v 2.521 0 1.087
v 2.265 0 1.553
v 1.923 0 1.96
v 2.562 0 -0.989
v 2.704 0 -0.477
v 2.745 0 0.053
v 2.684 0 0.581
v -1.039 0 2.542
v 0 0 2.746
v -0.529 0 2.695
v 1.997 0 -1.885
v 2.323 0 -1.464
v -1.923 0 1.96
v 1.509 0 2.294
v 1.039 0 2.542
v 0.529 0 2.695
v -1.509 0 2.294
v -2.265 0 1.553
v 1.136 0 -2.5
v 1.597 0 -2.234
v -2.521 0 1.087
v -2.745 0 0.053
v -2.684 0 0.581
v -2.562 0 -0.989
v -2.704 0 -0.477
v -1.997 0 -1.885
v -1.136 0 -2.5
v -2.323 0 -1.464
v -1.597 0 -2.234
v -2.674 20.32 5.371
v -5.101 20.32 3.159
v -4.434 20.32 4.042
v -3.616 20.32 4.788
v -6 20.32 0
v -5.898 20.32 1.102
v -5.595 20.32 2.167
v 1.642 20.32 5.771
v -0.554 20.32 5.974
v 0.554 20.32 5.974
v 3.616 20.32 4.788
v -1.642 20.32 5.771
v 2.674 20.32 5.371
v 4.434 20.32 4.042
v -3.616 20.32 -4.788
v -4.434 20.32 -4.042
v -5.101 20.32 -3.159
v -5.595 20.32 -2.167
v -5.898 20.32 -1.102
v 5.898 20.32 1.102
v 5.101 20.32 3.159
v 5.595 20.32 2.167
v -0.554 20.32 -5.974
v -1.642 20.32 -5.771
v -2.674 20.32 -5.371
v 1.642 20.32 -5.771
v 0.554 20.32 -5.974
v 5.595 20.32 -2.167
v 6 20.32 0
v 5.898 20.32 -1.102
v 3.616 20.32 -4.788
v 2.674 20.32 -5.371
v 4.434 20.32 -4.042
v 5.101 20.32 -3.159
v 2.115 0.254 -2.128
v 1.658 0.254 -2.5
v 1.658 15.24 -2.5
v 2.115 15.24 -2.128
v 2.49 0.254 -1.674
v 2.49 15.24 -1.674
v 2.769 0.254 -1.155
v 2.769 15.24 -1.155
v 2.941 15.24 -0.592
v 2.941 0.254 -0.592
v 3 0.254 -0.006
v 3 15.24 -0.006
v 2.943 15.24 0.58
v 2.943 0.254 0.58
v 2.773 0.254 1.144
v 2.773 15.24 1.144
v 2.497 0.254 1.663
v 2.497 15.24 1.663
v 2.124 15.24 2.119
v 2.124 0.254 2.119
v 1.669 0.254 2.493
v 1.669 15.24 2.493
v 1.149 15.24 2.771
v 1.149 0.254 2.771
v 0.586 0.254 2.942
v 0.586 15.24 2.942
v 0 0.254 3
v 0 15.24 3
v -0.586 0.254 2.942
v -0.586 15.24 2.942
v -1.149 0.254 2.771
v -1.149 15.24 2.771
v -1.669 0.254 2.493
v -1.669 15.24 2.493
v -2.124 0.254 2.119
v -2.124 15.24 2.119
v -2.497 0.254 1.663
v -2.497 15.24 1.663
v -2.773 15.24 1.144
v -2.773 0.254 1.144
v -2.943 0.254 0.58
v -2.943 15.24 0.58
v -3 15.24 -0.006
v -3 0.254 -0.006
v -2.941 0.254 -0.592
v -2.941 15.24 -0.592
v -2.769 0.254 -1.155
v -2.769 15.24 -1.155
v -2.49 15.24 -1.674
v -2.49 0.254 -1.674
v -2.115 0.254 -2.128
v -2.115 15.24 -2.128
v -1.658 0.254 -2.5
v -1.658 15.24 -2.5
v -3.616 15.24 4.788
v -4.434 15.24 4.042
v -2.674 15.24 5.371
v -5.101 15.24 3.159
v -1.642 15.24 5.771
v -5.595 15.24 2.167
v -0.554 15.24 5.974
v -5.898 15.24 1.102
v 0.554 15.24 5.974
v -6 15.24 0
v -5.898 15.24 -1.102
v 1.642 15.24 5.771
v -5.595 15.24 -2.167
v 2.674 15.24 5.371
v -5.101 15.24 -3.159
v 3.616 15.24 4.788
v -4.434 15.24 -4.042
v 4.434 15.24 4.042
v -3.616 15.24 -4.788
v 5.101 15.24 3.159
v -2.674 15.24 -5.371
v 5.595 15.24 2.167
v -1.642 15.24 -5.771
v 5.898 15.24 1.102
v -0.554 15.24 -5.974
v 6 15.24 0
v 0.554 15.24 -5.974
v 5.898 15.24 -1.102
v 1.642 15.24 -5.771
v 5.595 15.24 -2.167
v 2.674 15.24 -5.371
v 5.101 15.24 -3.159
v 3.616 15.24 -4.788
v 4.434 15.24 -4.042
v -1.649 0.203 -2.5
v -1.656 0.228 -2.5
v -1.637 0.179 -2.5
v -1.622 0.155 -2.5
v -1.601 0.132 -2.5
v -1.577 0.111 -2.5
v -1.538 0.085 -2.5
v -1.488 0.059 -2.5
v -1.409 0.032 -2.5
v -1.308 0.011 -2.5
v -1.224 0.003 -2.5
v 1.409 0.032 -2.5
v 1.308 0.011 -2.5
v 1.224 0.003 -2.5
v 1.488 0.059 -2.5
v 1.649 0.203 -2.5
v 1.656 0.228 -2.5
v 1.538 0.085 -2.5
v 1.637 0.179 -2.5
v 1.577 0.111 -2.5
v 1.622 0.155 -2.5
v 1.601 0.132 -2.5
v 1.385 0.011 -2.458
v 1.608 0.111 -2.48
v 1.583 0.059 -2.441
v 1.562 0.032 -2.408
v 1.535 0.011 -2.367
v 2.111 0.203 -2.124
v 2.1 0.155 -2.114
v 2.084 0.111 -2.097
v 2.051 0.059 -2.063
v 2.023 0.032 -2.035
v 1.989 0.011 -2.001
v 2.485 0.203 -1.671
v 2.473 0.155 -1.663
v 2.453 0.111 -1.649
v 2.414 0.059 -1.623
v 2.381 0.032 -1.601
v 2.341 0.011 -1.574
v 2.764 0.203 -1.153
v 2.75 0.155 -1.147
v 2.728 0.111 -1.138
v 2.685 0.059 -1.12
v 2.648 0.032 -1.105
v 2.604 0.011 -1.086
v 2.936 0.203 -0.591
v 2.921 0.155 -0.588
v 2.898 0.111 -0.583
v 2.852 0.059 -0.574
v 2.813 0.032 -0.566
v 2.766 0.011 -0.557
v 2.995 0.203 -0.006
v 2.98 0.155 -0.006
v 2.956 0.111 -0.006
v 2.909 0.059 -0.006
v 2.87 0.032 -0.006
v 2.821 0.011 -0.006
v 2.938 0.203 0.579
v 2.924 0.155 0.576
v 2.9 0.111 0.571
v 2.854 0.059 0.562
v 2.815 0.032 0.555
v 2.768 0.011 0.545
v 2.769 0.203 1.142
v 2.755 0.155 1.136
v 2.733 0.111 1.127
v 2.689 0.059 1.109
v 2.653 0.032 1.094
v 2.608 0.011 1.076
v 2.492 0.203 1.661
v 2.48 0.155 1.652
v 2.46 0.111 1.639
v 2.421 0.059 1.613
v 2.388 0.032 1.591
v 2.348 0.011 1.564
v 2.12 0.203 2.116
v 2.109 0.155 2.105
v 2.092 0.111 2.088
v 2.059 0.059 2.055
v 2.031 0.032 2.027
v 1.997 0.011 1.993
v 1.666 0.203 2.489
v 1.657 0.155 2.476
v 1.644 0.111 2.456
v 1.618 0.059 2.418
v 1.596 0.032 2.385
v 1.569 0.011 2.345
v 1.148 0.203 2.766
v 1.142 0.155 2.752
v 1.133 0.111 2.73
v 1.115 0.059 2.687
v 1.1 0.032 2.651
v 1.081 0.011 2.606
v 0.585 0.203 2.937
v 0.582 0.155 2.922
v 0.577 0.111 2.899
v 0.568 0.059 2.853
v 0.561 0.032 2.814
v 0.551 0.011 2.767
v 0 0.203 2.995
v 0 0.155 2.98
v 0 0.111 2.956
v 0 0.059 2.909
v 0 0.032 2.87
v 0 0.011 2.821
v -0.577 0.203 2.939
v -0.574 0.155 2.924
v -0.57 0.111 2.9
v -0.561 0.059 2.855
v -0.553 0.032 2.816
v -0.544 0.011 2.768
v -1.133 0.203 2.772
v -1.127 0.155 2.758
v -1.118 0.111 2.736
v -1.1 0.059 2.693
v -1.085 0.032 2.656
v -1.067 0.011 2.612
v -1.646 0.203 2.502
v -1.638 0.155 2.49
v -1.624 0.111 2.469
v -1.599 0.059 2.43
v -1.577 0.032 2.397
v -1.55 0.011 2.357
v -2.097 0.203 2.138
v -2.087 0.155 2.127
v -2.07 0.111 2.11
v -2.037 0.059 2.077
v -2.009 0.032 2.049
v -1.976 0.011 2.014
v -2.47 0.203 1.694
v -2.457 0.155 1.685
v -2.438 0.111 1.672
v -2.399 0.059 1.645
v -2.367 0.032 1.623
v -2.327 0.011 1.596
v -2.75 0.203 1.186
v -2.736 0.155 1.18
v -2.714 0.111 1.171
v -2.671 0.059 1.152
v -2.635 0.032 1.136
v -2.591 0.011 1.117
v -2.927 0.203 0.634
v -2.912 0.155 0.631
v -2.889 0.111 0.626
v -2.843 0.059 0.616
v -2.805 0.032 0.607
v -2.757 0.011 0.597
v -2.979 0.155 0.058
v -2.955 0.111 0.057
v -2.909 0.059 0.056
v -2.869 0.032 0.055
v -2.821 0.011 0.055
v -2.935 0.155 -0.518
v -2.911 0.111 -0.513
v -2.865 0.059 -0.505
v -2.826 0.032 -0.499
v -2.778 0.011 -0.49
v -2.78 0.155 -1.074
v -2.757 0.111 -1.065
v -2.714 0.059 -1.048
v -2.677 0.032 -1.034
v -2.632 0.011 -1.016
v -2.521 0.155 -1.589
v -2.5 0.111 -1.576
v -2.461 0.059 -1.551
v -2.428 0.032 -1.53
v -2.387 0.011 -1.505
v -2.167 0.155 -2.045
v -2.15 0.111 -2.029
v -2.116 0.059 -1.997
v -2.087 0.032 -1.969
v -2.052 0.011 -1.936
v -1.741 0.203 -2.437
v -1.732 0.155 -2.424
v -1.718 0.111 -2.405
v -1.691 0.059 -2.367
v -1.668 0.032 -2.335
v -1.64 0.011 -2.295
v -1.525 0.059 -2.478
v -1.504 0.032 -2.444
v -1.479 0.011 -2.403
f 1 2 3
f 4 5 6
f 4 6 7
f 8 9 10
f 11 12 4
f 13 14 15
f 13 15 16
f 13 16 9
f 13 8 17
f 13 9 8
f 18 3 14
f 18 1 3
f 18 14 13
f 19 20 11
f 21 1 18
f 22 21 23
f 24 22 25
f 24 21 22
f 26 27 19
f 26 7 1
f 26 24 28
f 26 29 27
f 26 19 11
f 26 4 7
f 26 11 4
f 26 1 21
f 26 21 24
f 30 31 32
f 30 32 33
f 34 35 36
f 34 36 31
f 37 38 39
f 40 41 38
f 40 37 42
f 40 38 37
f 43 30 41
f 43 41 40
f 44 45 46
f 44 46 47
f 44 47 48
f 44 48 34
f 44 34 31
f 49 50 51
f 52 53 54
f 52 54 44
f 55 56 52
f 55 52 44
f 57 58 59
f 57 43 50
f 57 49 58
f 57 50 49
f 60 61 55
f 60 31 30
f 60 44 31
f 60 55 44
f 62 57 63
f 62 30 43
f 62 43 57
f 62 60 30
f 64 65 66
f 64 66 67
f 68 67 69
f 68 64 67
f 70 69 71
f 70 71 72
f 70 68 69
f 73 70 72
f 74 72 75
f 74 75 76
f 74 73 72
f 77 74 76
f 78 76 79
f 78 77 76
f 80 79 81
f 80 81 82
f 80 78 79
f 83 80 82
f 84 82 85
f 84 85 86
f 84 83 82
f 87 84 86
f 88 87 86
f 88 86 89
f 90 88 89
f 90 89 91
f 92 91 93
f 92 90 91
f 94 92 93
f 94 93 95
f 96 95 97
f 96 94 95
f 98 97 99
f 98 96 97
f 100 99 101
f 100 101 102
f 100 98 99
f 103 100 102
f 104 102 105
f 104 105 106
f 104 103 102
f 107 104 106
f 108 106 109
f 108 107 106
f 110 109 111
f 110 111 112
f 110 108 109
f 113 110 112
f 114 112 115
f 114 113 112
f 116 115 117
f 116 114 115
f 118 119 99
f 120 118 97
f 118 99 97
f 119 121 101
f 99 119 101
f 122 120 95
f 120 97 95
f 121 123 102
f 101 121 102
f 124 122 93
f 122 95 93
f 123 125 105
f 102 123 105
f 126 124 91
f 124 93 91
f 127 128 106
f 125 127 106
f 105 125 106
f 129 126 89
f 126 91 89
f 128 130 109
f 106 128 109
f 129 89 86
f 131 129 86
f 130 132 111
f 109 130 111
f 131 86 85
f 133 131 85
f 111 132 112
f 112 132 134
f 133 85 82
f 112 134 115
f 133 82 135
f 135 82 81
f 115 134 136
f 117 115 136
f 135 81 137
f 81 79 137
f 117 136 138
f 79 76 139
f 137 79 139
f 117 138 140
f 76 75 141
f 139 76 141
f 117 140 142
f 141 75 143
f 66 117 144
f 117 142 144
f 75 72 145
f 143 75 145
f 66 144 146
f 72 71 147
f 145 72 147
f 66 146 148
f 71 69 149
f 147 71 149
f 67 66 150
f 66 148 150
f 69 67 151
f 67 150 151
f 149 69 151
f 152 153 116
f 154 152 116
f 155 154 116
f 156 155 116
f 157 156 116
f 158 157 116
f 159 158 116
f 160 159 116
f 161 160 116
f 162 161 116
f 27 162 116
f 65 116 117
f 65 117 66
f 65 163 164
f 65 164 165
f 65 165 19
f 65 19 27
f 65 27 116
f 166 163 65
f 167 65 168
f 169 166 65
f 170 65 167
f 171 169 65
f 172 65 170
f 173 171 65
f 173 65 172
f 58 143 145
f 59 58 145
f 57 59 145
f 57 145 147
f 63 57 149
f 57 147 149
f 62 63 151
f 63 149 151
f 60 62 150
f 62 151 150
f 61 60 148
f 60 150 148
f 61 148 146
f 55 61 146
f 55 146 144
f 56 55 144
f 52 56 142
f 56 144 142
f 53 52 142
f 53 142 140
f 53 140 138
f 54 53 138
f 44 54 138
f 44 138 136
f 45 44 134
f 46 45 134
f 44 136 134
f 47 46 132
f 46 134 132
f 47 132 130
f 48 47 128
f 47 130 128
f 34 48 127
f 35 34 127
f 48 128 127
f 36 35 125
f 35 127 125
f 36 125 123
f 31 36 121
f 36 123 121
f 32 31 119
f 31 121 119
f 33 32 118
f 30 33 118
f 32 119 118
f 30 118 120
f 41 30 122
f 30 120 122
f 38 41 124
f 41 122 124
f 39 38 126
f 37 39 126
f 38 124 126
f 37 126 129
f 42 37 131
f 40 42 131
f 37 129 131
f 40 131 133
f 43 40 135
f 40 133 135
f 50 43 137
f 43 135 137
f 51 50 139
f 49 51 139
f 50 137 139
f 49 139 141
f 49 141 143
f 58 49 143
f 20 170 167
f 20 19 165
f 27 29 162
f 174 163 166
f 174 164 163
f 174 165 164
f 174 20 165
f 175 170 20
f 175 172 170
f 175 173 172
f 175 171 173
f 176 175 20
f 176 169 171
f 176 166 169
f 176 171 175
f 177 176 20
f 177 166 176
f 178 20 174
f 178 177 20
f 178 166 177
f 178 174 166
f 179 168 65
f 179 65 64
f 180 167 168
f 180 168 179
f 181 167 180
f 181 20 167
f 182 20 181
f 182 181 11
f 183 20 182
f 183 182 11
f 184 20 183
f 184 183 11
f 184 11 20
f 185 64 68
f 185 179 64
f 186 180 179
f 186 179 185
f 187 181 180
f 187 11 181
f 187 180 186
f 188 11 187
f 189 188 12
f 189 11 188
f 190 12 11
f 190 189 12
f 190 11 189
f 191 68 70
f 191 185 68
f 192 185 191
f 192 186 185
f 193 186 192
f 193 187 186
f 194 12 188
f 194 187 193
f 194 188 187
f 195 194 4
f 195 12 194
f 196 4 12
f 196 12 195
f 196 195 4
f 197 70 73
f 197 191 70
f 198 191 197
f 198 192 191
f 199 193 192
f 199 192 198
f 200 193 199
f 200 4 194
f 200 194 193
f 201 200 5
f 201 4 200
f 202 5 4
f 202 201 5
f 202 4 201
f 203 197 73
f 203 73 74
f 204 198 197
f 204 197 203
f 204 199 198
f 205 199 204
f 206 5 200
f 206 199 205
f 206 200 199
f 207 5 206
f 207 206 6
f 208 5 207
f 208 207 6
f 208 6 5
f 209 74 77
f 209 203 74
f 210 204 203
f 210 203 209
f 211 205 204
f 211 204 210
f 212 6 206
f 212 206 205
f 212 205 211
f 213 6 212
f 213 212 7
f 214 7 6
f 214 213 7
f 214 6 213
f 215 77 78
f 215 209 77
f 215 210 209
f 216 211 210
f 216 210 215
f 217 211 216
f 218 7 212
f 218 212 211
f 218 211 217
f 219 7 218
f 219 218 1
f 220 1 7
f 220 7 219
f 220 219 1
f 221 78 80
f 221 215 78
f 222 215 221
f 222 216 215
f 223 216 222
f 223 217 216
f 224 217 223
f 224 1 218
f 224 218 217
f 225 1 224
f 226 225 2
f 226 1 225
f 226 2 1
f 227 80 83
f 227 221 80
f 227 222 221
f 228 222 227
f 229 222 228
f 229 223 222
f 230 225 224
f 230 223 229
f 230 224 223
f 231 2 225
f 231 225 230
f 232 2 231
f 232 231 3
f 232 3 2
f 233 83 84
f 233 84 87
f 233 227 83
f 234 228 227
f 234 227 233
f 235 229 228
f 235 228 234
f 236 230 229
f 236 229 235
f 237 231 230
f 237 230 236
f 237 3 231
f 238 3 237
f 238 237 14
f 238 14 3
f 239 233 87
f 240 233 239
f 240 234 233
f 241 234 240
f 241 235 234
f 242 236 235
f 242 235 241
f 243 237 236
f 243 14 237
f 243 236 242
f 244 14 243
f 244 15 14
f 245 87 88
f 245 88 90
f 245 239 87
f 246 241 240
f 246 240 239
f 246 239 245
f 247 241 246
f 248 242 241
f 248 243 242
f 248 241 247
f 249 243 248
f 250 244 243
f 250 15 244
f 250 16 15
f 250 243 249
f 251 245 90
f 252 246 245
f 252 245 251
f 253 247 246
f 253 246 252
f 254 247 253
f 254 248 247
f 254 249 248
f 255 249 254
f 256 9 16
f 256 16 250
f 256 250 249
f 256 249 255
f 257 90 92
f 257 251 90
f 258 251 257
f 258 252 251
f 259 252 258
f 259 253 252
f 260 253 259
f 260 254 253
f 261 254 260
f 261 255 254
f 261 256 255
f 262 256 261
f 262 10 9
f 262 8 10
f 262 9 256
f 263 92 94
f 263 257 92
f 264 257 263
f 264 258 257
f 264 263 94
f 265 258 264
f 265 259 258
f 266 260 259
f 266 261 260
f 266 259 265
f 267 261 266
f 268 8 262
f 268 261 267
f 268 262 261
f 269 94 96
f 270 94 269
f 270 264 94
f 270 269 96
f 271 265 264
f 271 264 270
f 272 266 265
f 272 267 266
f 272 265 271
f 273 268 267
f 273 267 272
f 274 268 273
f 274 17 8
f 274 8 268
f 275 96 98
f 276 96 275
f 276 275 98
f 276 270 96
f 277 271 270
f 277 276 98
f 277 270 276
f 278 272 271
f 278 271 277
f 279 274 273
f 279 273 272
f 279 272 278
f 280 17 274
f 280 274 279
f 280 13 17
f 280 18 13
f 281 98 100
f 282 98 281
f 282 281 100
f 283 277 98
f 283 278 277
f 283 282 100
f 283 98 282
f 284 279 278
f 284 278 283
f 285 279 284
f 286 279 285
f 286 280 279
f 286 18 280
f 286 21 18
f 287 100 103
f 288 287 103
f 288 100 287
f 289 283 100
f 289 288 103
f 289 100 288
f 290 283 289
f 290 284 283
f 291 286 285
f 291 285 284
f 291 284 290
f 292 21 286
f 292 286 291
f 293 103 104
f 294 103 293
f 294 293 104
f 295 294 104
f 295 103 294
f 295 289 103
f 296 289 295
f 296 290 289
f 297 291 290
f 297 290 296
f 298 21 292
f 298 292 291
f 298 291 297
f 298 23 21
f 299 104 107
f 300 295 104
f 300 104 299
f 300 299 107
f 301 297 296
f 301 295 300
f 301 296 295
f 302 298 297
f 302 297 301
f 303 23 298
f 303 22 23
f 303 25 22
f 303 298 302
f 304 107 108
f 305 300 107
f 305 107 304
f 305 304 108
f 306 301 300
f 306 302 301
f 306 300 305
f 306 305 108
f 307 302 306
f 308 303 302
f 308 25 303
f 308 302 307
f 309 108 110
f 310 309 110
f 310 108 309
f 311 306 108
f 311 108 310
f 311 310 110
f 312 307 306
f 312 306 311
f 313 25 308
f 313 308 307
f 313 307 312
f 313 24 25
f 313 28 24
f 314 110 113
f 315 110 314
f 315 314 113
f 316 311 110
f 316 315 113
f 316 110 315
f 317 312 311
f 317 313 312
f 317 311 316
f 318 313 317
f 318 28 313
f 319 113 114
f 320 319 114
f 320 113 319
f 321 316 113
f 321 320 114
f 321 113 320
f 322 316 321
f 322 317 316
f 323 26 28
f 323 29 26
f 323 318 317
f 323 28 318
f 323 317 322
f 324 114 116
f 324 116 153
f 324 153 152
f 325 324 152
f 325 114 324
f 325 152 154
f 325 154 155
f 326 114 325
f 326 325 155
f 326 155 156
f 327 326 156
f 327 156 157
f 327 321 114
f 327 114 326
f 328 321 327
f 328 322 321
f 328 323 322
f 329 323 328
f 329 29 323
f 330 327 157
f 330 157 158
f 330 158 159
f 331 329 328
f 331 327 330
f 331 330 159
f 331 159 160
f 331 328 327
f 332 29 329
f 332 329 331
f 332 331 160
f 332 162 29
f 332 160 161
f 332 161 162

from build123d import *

# Parameters (mm, degrees)
BOSS_EXTRUDE1_DEPTH = 15.24
SKETCH2_R           = 6
BOSS_EXTRUDE2_DEPTH = 5.08
FILLET1_R           = 0.254


with BuildPart() as part:
    # Sketch1 → Boss-Extrude1 (new body)
    with BuildSketch(Plane(origin=(0, 0, 0), x_dir=(1, 0, 0), z_dir=(0, 1, 0))):
        with BuildLine():
            Line((-1.658312395, 2.5), (1.658312395, 2.5))
            ThreePointArc((1.658312395, 2.5), (0, -3), (-1.658312395, 2.5))
        make_face()
    extrude(amount=BOSS_EXTRUDE1_DEPTH)

    # Sketch2 → Boss-Extrude2 (add)
    with BuildSketch(Plane(origin=(0, 15.24, 0), x_dir=(1, 0, 0), z_dir=(0, 1, 0))):
        Circle(SKETCH2_R)
    extrude(amount=BOSS_EXTRUDE2_DEPTH)

    # Fillet1
    fillet1_edges = [part.edges().sort_by_distance(p)[0] for p in [
        (0, 0, 3),
    ]]
    fillet(fillet1_edges, radius=FILLET1_R)


solid = part.part
